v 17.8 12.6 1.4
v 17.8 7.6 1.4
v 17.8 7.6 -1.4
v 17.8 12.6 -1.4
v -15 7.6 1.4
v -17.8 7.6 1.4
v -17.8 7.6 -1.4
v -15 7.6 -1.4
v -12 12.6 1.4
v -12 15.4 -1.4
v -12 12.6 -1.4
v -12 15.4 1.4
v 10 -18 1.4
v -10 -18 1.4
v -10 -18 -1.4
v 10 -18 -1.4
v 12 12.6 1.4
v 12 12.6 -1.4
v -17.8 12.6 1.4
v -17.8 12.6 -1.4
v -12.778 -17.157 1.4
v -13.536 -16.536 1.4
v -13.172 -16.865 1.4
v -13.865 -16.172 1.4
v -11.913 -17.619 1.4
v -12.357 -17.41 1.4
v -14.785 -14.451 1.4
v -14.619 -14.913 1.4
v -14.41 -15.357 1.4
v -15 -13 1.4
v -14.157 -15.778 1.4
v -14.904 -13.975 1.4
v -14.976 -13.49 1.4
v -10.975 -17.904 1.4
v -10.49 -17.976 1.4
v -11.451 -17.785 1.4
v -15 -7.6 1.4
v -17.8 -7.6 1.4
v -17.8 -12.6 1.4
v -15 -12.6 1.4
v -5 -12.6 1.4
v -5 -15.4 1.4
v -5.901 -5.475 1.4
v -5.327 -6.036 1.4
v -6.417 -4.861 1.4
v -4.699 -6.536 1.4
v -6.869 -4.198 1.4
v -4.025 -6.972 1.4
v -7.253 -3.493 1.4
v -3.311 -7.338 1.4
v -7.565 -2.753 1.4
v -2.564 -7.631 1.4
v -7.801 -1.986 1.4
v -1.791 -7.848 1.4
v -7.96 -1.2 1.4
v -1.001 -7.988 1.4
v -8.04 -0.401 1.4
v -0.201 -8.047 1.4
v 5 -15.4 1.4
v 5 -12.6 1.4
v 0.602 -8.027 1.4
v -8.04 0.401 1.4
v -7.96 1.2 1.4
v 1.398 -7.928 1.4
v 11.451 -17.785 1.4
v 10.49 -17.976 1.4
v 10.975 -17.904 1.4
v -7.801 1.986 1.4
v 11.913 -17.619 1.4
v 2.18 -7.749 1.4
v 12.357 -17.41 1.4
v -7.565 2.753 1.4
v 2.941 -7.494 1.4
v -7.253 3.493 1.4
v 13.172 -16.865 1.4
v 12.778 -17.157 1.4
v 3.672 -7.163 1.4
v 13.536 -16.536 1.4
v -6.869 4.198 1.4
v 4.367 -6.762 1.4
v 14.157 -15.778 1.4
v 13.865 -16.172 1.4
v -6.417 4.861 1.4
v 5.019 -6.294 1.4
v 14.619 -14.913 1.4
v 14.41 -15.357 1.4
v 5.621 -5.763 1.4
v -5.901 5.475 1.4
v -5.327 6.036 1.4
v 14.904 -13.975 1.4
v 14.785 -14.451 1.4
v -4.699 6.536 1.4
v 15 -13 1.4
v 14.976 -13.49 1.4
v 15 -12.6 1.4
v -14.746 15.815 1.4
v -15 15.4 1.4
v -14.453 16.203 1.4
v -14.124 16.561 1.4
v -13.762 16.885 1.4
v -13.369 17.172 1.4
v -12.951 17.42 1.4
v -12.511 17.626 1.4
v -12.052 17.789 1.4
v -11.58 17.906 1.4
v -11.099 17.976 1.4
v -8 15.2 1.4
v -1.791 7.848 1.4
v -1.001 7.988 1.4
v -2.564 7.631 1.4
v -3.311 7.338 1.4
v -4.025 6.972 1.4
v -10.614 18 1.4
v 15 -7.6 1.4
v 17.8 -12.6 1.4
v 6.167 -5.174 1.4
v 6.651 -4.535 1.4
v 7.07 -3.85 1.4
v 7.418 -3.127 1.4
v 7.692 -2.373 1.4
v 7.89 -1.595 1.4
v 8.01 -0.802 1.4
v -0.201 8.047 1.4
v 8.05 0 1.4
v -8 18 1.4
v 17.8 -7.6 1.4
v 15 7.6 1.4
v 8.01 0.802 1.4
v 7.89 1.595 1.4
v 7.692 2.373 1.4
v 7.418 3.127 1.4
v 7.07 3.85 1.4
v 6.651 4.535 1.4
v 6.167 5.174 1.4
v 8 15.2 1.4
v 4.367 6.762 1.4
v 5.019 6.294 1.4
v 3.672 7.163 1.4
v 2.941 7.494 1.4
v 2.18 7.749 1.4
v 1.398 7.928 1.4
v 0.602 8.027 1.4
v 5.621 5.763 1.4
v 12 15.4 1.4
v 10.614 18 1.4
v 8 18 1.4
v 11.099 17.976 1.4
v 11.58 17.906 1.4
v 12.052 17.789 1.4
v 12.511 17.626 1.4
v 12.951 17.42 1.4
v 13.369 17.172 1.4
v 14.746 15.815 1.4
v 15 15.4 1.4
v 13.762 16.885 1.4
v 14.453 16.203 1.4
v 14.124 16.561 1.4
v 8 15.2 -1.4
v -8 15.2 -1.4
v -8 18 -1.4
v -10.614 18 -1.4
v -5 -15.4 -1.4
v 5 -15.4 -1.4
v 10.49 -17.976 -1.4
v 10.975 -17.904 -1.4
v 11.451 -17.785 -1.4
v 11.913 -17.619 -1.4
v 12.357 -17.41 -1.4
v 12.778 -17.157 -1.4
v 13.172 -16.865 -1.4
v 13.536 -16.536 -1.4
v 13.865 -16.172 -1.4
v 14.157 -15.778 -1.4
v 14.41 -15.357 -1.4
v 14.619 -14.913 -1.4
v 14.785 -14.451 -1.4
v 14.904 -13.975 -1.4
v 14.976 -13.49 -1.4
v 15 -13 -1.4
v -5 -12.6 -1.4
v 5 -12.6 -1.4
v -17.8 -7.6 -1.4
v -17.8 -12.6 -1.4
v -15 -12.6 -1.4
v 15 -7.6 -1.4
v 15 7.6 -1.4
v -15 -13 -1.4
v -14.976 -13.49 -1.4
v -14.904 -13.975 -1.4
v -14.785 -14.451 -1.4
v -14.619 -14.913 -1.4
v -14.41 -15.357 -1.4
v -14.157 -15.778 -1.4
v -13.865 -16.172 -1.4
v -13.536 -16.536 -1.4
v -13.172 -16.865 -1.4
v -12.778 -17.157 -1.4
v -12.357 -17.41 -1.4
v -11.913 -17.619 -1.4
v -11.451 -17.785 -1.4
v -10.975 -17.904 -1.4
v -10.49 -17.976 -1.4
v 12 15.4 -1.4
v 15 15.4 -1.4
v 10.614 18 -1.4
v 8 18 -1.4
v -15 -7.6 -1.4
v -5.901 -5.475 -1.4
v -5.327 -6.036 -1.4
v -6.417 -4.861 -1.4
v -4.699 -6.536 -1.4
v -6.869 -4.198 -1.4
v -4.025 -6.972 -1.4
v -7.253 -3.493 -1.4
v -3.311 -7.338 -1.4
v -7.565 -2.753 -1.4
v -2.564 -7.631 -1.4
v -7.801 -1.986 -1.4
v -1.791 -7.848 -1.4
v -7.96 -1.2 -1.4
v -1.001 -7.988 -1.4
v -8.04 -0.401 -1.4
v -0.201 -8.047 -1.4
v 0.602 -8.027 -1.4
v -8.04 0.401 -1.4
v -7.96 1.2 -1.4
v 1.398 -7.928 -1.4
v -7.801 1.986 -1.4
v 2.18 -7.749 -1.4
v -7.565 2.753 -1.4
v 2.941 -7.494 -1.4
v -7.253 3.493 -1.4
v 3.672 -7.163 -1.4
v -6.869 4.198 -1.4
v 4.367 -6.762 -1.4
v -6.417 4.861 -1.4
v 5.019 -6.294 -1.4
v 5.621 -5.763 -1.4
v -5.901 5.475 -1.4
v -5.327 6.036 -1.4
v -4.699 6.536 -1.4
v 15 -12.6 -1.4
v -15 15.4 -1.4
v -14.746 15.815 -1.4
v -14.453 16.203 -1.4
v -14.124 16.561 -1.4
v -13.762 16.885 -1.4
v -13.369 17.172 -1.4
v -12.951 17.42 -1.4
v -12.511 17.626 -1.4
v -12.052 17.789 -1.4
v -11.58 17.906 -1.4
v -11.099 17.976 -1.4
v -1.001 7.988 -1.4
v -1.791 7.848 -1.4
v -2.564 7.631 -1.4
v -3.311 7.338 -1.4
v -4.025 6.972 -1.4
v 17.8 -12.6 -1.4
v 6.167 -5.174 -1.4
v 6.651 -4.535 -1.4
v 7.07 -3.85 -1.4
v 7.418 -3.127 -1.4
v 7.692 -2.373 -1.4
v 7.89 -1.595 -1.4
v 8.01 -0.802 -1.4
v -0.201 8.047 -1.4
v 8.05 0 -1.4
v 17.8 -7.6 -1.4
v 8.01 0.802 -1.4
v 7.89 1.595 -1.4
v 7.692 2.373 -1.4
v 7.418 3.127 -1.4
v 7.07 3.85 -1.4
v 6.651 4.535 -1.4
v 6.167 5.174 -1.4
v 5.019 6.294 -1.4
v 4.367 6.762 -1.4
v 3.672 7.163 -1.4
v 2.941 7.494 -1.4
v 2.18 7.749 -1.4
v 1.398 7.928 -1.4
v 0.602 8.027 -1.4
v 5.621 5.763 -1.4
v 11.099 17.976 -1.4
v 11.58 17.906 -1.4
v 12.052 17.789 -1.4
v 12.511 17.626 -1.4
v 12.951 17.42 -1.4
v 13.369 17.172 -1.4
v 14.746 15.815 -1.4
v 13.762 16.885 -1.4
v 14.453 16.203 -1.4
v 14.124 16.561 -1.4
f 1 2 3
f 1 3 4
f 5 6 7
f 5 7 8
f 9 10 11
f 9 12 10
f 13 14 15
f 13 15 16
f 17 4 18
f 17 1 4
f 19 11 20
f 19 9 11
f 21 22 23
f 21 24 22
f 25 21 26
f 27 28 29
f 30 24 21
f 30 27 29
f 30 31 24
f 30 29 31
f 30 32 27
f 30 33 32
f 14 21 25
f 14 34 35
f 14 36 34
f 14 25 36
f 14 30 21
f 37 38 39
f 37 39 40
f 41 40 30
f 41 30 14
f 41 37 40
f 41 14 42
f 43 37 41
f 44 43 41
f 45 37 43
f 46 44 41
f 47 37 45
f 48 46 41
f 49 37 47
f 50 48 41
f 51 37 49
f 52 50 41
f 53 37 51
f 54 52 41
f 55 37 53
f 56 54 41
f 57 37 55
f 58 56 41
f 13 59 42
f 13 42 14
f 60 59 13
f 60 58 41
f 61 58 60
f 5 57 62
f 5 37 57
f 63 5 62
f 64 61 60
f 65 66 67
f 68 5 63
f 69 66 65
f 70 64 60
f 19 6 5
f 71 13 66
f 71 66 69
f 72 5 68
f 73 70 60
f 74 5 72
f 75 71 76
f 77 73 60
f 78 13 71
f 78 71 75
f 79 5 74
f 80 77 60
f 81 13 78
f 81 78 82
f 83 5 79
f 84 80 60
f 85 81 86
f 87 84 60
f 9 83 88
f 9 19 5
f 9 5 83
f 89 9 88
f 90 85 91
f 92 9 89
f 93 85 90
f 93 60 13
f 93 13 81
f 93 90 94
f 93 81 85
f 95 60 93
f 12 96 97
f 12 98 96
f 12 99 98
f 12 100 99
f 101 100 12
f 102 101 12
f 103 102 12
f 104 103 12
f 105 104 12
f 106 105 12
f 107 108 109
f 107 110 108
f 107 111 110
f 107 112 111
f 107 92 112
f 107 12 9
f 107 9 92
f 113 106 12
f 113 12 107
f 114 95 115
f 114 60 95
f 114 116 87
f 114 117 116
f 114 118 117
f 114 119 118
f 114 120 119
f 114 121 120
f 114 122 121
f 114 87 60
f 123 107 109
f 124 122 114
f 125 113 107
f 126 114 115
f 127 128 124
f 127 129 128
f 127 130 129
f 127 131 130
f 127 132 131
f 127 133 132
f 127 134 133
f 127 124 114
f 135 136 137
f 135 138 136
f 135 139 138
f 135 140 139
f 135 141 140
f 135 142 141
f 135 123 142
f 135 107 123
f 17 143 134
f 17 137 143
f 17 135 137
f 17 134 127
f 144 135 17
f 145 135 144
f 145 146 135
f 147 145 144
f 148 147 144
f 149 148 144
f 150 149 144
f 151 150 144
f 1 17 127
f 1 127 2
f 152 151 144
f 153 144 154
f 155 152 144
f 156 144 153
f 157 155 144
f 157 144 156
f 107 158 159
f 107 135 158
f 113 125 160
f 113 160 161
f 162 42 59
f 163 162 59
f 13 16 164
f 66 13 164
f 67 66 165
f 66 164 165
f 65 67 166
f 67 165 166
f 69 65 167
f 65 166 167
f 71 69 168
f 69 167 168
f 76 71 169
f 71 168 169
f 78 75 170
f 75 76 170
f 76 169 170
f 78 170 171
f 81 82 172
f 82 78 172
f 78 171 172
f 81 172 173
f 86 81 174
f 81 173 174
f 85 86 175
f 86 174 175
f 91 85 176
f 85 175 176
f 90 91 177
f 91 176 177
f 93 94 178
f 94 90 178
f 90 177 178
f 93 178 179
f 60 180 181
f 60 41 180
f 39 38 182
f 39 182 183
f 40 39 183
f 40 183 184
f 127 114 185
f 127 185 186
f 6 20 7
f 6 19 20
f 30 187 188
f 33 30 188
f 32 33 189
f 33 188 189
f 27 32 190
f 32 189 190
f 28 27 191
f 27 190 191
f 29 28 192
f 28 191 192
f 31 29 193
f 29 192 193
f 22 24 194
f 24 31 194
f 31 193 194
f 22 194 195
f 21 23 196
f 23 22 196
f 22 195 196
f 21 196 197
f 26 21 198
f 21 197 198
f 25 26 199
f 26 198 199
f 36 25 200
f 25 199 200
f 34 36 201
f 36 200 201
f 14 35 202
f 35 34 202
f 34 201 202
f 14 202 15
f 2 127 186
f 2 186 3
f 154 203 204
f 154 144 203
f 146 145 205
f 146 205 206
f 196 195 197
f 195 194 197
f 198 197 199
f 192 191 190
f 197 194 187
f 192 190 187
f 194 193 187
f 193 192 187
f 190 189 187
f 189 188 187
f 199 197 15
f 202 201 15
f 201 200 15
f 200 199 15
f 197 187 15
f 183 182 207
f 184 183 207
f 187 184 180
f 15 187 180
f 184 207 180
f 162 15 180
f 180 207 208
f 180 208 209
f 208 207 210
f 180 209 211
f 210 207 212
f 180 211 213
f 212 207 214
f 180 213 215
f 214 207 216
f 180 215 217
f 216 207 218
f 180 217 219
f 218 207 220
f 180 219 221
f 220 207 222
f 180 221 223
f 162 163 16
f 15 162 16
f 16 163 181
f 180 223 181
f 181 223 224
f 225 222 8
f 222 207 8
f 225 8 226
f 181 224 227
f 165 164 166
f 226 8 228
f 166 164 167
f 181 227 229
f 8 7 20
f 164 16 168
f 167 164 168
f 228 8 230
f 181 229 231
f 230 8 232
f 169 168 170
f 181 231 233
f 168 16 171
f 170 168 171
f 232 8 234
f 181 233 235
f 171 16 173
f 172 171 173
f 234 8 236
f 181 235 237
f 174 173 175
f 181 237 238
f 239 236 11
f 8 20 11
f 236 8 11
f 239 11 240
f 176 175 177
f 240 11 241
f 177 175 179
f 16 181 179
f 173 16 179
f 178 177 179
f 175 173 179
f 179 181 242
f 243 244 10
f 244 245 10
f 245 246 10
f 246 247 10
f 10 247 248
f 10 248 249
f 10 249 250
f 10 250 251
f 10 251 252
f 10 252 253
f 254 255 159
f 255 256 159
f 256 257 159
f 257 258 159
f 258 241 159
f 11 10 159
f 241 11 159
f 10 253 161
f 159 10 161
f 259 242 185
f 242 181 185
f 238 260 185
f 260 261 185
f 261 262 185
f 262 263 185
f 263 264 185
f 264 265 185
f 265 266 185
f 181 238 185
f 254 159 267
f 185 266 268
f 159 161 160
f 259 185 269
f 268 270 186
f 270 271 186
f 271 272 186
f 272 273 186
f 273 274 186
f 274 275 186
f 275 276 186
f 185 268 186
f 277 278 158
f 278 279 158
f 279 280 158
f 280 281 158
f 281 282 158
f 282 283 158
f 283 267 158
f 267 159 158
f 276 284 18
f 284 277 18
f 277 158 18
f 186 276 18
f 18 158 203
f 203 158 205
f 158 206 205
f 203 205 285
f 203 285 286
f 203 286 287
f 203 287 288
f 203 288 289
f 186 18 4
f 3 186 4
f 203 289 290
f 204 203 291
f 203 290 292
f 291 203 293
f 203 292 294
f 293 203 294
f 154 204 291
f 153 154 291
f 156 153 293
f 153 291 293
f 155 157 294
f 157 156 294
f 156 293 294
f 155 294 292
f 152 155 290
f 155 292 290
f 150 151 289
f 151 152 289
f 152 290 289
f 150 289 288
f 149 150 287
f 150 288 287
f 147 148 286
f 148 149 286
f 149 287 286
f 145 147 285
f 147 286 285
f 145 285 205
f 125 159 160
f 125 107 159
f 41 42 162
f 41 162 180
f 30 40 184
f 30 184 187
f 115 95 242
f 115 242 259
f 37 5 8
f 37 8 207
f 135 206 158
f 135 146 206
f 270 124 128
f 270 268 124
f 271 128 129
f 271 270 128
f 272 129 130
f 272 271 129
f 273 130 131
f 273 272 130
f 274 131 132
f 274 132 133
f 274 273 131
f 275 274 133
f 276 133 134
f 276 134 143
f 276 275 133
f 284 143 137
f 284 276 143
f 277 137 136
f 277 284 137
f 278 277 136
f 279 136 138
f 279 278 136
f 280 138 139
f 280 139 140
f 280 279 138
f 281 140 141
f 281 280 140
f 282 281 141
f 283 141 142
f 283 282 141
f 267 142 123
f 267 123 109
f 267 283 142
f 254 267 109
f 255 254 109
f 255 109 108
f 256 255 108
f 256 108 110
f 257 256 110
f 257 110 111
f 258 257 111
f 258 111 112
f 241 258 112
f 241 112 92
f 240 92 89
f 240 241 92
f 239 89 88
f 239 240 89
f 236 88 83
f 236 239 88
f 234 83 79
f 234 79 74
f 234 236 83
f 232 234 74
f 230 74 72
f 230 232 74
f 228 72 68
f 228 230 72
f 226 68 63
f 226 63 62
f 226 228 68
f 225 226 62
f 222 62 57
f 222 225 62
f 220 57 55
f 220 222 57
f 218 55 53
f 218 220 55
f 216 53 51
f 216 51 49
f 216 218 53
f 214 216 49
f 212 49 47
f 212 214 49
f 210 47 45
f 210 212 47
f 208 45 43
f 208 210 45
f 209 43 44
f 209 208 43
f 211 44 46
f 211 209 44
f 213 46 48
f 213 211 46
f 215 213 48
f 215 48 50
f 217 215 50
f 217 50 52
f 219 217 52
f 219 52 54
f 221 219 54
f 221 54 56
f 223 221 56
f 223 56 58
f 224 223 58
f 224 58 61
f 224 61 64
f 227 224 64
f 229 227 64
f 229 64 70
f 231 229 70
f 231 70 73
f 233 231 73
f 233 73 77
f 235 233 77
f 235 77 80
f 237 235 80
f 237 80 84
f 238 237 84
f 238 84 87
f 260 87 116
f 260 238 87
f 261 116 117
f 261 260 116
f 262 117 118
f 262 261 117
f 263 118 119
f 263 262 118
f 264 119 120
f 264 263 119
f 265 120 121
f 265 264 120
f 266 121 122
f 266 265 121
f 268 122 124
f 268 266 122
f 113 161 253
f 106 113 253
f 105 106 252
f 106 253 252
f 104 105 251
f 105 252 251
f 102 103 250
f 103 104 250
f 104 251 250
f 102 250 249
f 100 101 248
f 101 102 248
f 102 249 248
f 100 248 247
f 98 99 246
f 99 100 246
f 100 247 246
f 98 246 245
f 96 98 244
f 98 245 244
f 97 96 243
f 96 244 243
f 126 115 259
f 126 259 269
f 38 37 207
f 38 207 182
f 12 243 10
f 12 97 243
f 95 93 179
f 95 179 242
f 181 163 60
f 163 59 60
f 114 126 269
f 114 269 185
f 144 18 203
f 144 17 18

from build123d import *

# Parameters (mm, degrees)
SKETCH_1_R      = 8.05
SKETCH_1_W      = 10
SKETCH_1_H      = 2.8
EXTRUDE_1_DEPTH = 1.4
FILLET_1_R      = 5


with BuildPart() as part:
    # Эскиз1 → Бобышка-Вытянуть1 (new, symmetric)
    with BuildSketch(Plane.XY):
        Polygon((-15, 12.6), (-17.8, 12.6), (-17.8, 7.6), (-15, 7.6), (-15, -7.6), (-17.8, -7.6), (-17.8, -12.6), (-15, -12.6), (-15, -18), (15, -18), (15, -12.6), (17.8, -12.6), (17.8, -7.6), (15, -7.6), (15, 7.6), (17.8, 7.6), (17.8, 12.6), (15, 12.6), (12, 12.6), (12, 15.4), (15, 15.4), (15, 18), (8, 18), (8, 15.2), (-8, 15.2), (-8, 18), (-15, 18), (-15, 15.4), (-12, 15.4), (-12, 12.6), align=None)
        Circle(SKETCH_1_R, mode=Mode.SUBTRACT)
        with Locations((0, -14)):
            Rectangle(SKETCH_1_W, SKETCH_1_H, mode=Mode.SUBTRACT)
    extrude(amount=EXTRUDE_1_DEPTH, both=True)

    # Скругление1
    # the kernel refuses this fillet: 5 mm, written as the material it takes off along each edge
    with BuildSketch(Plane(origin=(15, 18, -12.3658561), x_dir=(-1, 0, 0), z_dir=(0, 0, 1))) as fillet_1_piece_1:
        with BuildLine():
            CenterArc((4.38634244, 5), FILLET_1_R, 208.685402014, 61.314597986)
            Line((0, 2.6), (-0.087726849, 2.552))
            ThreePointArc((-0.087726849, 2.552), (-0.1, 1.3), (-0.1, 0))
            Line((-0.1, 0), (0, -0.1))
            Line((0, -0.1), (4.38634244, -0.1))
            Line((4.38634244, -0.1), (4.38634244, 0))
        make_face()
    extrude(amount=24.731712199, mode=Mode.SUBTRACT)
    with BuildSketch(Plane(origin=(15, -18, -13.9), x_dir=(0, 1, 0), z_dir=(0, 0, 1)), Plane(origin=(-15, -18, -13.9), x_dir=(1, 0, 0), z_dir=(0, 0, 1))) as fillet_1_piece_2:
        with BuildLine():
            CenterArc((FILLET_1_R, FILLET_1_R), FILLET_1_R, 180, 90)
            Line((0, FILLET_1_R), (-FILLET_1_R * 0.02, FILLET_1_R))
            Line((-FILLET_1_R * 0.02, FILLET_1_R), (-FILLET_1_R * 0.02, -FILLET_1_R * 0.02))
            Line((-FILLET_1_R * 0.02, -FILLET_1_R * 0.02), (FILLET_1_R, -FILLET_1_R * 0.02))
            Line((FILLET_1_R, -FILLET_1_R * 0.02), (FILLET_1_R, 0))
        make_face()
    extrude(amount=27.8, mode=Mode.SUBTRACT)
    with BuildSketch(Plane(origin=(-15, 18, -12.3658561), x_dir=(0, -1, 0), z_dir=(0, 0, 1))) as fillet_1_piece_3:
        with BuildLine():
            CenterArc((5, 4.38634244), FILLET_1_R, 180, 61.314597986)
            Line((0, 4.38634244), (-0.1, 4.38634244))
            Line((-0.1, 4.38634244), (-0.1, 0))
            Line((-0.1, 0), (0, -0.1))
            ThreePointArc((0, -0.1), (1.3, -0.1), (2.552, -0.087726849))
            Line((2.552, -0.087726849), (2.6, 0))
        make_face()
    extrude(amount=24.731712199, mode=Mode.SUBTRACT)


solid = part.part
